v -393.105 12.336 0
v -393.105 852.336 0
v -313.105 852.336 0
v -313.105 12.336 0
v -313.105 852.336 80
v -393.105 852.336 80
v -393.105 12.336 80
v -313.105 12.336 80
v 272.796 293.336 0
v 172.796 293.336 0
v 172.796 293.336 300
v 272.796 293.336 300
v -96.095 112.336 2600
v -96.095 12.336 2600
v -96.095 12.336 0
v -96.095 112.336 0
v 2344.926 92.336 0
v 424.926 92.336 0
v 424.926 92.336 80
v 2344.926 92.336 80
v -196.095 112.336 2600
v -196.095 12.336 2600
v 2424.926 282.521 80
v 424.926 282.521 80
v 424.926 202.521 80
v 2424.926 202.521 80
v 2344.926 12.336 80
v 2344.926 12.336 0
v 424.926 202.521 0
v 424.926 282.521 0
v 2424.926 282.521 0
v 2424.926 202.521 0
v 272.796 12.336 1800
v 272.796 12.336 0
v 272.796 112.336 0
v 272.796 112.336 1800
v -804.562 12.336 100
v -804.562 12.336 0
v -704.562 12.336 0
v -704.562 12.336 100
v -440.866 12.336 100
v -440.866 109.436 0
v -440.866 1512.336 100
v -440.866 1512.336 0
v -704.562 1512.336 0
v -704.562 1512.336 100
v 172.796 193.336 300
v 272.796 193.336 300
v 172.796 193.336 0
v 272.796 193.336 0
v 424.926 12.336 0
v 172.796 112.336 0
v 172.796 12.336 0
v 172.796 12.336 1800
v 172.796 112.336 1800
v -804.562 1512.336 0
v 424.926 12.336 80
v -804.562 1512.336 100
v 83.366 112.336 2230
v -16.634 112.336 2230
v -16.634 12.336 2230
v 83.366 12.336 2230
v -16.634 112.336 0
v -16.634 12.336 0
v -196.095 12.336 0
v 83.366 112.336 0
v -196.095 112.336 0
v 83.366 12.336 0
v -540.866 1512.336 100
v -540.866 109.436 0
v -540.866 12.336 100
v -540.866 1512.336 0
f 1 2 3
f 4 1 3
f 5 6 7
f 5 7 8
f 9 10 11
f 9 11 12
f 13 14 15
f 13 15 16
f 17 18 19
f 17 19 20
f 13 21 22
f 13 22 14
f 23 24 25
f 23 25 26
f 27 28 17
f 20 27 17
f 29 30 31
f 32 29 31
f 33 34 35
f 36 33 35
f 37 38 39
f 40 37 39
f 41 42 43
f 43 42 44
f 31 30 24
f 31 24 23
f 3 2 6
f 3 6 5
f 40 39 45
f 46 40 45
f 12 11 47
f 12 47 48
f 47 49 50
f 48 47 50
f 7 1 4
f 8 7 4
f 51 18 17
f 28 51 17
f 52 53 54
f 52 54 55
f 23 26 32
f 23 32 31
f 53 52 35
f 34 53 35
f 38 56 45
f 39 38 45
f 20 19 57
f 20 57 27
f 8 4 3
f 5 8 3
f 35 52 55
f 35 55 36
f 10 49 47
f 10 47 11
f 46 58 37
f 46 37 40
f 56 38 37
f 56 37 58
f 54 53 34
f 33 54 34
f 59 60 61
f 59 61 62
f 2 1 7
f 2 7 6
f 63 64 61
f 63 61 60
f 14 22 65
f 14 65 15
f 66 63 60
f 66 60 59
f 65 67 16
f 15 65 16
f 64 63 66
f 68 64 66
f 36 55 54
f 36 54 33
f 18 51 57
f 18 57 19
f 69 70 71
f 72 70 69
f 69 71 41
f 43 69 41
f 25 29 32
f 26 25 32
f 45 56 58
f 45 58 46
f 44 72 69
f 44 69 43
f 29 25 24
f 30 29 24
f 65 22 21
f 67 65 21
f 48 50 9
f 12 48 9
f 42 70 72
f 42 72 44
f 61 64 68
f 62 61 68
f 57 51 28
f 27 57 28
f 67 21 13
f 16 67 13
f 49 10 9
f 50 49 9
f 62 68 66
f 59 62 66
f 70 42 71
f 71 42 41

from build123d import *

# Parameters (mm, degrees)
F0_W     = 100
F0_H     = 100
F1_DEPTH = 2600
F2_DEPTH = 2230
F3_DEPTH = 1800
F0_H_2   = 1500
F4_DEPTH = 100
F5_DEPTH = 300
F0_W_2   = 1920
F0_H_3   = 80
F0_W_3   = 2000
F0_W_4   = 80
F0_H_4   = 840
F6_DEPTH = 80
F8_DEPTH = 100


with BuildPart() as f1:
    # F0 (on Top) → F1 (new body)
    with BuildSketch(Plane.XY):
        with Locations((-146.095169, 62.335808)):
            Rectangle(F0_W, F0_H)
    extrude(amount=F1_DEPTH)


with BuildPart() as f2:
    # F0 (on Top) → F2 (new body)
    with BuildSketch(Plane.XY):
        with Locations((33.366184, 62.335808)):
            Rectangle(F0_W, F0_H)
    extrude(amount=F2_DEPTH)


with BuildPart() as f3:
    # F0 (on Top) → F3 (new body)
    with BuildSketch(Plane.XY):
        with Locations((222.795501, 62.335808)):
            Rectangle(F0_W, F0_H)
    extrude(amount=F3_DEPTH)


with BuildPart() as f4:
    # F0 (on Top) → F4 (new body)
    with BuildSketch(Plane.XY):
        with Locations((-490.865839, 762.335808)):
            Rectangle(F0_W, F0_H_2)
        with Locations((-754.561555, 762.335808)):
            Rectangle(F0_W, F0_H_2)
    extrude(amount=F4_DEPTH)

    # F7 (on face) → F8 (cut)
    with BuildSketch(Plane.YZ.offset(-440.865839)):
        Polygon((12.335808, 100), (12.335808, 97.100623), (12.335808, 0), (109.436318, 0), align=None)
    extrude(amount=-F8_DEPTH, mode=Mode.SUBTRACT)


with BuildPart() as f5:
    # F0 (on Top) → F5 (new body)
    with BuildSketch(Plane.XY):
        with Locations((222.795501, 243.335801)):
            Rectangle(F0_W, F0_H)
    extrude(amount=F5_DEPTH)


with BuildPart() as f6:
    # F0 (on Top) → F6 (new body)
    with BuildSketch(Plane.XY):
        with Locations((1384.925715, 52.335808)):
            Rectangle(F0_W_2, F0_H_3)
        with Locations((1424.925715, 242.520639)):
            Rectangle(F0_W_3, F0_H_3)
        with Locations((-353.104821, 432.335808)):
            Rectangle(F0_W_4, F0_H_4)
    extrude(amount=F6_DEPTH)


solid = Compound([f1.part, f2.part, f3.part, f4.part, f5.part, f6.part])
